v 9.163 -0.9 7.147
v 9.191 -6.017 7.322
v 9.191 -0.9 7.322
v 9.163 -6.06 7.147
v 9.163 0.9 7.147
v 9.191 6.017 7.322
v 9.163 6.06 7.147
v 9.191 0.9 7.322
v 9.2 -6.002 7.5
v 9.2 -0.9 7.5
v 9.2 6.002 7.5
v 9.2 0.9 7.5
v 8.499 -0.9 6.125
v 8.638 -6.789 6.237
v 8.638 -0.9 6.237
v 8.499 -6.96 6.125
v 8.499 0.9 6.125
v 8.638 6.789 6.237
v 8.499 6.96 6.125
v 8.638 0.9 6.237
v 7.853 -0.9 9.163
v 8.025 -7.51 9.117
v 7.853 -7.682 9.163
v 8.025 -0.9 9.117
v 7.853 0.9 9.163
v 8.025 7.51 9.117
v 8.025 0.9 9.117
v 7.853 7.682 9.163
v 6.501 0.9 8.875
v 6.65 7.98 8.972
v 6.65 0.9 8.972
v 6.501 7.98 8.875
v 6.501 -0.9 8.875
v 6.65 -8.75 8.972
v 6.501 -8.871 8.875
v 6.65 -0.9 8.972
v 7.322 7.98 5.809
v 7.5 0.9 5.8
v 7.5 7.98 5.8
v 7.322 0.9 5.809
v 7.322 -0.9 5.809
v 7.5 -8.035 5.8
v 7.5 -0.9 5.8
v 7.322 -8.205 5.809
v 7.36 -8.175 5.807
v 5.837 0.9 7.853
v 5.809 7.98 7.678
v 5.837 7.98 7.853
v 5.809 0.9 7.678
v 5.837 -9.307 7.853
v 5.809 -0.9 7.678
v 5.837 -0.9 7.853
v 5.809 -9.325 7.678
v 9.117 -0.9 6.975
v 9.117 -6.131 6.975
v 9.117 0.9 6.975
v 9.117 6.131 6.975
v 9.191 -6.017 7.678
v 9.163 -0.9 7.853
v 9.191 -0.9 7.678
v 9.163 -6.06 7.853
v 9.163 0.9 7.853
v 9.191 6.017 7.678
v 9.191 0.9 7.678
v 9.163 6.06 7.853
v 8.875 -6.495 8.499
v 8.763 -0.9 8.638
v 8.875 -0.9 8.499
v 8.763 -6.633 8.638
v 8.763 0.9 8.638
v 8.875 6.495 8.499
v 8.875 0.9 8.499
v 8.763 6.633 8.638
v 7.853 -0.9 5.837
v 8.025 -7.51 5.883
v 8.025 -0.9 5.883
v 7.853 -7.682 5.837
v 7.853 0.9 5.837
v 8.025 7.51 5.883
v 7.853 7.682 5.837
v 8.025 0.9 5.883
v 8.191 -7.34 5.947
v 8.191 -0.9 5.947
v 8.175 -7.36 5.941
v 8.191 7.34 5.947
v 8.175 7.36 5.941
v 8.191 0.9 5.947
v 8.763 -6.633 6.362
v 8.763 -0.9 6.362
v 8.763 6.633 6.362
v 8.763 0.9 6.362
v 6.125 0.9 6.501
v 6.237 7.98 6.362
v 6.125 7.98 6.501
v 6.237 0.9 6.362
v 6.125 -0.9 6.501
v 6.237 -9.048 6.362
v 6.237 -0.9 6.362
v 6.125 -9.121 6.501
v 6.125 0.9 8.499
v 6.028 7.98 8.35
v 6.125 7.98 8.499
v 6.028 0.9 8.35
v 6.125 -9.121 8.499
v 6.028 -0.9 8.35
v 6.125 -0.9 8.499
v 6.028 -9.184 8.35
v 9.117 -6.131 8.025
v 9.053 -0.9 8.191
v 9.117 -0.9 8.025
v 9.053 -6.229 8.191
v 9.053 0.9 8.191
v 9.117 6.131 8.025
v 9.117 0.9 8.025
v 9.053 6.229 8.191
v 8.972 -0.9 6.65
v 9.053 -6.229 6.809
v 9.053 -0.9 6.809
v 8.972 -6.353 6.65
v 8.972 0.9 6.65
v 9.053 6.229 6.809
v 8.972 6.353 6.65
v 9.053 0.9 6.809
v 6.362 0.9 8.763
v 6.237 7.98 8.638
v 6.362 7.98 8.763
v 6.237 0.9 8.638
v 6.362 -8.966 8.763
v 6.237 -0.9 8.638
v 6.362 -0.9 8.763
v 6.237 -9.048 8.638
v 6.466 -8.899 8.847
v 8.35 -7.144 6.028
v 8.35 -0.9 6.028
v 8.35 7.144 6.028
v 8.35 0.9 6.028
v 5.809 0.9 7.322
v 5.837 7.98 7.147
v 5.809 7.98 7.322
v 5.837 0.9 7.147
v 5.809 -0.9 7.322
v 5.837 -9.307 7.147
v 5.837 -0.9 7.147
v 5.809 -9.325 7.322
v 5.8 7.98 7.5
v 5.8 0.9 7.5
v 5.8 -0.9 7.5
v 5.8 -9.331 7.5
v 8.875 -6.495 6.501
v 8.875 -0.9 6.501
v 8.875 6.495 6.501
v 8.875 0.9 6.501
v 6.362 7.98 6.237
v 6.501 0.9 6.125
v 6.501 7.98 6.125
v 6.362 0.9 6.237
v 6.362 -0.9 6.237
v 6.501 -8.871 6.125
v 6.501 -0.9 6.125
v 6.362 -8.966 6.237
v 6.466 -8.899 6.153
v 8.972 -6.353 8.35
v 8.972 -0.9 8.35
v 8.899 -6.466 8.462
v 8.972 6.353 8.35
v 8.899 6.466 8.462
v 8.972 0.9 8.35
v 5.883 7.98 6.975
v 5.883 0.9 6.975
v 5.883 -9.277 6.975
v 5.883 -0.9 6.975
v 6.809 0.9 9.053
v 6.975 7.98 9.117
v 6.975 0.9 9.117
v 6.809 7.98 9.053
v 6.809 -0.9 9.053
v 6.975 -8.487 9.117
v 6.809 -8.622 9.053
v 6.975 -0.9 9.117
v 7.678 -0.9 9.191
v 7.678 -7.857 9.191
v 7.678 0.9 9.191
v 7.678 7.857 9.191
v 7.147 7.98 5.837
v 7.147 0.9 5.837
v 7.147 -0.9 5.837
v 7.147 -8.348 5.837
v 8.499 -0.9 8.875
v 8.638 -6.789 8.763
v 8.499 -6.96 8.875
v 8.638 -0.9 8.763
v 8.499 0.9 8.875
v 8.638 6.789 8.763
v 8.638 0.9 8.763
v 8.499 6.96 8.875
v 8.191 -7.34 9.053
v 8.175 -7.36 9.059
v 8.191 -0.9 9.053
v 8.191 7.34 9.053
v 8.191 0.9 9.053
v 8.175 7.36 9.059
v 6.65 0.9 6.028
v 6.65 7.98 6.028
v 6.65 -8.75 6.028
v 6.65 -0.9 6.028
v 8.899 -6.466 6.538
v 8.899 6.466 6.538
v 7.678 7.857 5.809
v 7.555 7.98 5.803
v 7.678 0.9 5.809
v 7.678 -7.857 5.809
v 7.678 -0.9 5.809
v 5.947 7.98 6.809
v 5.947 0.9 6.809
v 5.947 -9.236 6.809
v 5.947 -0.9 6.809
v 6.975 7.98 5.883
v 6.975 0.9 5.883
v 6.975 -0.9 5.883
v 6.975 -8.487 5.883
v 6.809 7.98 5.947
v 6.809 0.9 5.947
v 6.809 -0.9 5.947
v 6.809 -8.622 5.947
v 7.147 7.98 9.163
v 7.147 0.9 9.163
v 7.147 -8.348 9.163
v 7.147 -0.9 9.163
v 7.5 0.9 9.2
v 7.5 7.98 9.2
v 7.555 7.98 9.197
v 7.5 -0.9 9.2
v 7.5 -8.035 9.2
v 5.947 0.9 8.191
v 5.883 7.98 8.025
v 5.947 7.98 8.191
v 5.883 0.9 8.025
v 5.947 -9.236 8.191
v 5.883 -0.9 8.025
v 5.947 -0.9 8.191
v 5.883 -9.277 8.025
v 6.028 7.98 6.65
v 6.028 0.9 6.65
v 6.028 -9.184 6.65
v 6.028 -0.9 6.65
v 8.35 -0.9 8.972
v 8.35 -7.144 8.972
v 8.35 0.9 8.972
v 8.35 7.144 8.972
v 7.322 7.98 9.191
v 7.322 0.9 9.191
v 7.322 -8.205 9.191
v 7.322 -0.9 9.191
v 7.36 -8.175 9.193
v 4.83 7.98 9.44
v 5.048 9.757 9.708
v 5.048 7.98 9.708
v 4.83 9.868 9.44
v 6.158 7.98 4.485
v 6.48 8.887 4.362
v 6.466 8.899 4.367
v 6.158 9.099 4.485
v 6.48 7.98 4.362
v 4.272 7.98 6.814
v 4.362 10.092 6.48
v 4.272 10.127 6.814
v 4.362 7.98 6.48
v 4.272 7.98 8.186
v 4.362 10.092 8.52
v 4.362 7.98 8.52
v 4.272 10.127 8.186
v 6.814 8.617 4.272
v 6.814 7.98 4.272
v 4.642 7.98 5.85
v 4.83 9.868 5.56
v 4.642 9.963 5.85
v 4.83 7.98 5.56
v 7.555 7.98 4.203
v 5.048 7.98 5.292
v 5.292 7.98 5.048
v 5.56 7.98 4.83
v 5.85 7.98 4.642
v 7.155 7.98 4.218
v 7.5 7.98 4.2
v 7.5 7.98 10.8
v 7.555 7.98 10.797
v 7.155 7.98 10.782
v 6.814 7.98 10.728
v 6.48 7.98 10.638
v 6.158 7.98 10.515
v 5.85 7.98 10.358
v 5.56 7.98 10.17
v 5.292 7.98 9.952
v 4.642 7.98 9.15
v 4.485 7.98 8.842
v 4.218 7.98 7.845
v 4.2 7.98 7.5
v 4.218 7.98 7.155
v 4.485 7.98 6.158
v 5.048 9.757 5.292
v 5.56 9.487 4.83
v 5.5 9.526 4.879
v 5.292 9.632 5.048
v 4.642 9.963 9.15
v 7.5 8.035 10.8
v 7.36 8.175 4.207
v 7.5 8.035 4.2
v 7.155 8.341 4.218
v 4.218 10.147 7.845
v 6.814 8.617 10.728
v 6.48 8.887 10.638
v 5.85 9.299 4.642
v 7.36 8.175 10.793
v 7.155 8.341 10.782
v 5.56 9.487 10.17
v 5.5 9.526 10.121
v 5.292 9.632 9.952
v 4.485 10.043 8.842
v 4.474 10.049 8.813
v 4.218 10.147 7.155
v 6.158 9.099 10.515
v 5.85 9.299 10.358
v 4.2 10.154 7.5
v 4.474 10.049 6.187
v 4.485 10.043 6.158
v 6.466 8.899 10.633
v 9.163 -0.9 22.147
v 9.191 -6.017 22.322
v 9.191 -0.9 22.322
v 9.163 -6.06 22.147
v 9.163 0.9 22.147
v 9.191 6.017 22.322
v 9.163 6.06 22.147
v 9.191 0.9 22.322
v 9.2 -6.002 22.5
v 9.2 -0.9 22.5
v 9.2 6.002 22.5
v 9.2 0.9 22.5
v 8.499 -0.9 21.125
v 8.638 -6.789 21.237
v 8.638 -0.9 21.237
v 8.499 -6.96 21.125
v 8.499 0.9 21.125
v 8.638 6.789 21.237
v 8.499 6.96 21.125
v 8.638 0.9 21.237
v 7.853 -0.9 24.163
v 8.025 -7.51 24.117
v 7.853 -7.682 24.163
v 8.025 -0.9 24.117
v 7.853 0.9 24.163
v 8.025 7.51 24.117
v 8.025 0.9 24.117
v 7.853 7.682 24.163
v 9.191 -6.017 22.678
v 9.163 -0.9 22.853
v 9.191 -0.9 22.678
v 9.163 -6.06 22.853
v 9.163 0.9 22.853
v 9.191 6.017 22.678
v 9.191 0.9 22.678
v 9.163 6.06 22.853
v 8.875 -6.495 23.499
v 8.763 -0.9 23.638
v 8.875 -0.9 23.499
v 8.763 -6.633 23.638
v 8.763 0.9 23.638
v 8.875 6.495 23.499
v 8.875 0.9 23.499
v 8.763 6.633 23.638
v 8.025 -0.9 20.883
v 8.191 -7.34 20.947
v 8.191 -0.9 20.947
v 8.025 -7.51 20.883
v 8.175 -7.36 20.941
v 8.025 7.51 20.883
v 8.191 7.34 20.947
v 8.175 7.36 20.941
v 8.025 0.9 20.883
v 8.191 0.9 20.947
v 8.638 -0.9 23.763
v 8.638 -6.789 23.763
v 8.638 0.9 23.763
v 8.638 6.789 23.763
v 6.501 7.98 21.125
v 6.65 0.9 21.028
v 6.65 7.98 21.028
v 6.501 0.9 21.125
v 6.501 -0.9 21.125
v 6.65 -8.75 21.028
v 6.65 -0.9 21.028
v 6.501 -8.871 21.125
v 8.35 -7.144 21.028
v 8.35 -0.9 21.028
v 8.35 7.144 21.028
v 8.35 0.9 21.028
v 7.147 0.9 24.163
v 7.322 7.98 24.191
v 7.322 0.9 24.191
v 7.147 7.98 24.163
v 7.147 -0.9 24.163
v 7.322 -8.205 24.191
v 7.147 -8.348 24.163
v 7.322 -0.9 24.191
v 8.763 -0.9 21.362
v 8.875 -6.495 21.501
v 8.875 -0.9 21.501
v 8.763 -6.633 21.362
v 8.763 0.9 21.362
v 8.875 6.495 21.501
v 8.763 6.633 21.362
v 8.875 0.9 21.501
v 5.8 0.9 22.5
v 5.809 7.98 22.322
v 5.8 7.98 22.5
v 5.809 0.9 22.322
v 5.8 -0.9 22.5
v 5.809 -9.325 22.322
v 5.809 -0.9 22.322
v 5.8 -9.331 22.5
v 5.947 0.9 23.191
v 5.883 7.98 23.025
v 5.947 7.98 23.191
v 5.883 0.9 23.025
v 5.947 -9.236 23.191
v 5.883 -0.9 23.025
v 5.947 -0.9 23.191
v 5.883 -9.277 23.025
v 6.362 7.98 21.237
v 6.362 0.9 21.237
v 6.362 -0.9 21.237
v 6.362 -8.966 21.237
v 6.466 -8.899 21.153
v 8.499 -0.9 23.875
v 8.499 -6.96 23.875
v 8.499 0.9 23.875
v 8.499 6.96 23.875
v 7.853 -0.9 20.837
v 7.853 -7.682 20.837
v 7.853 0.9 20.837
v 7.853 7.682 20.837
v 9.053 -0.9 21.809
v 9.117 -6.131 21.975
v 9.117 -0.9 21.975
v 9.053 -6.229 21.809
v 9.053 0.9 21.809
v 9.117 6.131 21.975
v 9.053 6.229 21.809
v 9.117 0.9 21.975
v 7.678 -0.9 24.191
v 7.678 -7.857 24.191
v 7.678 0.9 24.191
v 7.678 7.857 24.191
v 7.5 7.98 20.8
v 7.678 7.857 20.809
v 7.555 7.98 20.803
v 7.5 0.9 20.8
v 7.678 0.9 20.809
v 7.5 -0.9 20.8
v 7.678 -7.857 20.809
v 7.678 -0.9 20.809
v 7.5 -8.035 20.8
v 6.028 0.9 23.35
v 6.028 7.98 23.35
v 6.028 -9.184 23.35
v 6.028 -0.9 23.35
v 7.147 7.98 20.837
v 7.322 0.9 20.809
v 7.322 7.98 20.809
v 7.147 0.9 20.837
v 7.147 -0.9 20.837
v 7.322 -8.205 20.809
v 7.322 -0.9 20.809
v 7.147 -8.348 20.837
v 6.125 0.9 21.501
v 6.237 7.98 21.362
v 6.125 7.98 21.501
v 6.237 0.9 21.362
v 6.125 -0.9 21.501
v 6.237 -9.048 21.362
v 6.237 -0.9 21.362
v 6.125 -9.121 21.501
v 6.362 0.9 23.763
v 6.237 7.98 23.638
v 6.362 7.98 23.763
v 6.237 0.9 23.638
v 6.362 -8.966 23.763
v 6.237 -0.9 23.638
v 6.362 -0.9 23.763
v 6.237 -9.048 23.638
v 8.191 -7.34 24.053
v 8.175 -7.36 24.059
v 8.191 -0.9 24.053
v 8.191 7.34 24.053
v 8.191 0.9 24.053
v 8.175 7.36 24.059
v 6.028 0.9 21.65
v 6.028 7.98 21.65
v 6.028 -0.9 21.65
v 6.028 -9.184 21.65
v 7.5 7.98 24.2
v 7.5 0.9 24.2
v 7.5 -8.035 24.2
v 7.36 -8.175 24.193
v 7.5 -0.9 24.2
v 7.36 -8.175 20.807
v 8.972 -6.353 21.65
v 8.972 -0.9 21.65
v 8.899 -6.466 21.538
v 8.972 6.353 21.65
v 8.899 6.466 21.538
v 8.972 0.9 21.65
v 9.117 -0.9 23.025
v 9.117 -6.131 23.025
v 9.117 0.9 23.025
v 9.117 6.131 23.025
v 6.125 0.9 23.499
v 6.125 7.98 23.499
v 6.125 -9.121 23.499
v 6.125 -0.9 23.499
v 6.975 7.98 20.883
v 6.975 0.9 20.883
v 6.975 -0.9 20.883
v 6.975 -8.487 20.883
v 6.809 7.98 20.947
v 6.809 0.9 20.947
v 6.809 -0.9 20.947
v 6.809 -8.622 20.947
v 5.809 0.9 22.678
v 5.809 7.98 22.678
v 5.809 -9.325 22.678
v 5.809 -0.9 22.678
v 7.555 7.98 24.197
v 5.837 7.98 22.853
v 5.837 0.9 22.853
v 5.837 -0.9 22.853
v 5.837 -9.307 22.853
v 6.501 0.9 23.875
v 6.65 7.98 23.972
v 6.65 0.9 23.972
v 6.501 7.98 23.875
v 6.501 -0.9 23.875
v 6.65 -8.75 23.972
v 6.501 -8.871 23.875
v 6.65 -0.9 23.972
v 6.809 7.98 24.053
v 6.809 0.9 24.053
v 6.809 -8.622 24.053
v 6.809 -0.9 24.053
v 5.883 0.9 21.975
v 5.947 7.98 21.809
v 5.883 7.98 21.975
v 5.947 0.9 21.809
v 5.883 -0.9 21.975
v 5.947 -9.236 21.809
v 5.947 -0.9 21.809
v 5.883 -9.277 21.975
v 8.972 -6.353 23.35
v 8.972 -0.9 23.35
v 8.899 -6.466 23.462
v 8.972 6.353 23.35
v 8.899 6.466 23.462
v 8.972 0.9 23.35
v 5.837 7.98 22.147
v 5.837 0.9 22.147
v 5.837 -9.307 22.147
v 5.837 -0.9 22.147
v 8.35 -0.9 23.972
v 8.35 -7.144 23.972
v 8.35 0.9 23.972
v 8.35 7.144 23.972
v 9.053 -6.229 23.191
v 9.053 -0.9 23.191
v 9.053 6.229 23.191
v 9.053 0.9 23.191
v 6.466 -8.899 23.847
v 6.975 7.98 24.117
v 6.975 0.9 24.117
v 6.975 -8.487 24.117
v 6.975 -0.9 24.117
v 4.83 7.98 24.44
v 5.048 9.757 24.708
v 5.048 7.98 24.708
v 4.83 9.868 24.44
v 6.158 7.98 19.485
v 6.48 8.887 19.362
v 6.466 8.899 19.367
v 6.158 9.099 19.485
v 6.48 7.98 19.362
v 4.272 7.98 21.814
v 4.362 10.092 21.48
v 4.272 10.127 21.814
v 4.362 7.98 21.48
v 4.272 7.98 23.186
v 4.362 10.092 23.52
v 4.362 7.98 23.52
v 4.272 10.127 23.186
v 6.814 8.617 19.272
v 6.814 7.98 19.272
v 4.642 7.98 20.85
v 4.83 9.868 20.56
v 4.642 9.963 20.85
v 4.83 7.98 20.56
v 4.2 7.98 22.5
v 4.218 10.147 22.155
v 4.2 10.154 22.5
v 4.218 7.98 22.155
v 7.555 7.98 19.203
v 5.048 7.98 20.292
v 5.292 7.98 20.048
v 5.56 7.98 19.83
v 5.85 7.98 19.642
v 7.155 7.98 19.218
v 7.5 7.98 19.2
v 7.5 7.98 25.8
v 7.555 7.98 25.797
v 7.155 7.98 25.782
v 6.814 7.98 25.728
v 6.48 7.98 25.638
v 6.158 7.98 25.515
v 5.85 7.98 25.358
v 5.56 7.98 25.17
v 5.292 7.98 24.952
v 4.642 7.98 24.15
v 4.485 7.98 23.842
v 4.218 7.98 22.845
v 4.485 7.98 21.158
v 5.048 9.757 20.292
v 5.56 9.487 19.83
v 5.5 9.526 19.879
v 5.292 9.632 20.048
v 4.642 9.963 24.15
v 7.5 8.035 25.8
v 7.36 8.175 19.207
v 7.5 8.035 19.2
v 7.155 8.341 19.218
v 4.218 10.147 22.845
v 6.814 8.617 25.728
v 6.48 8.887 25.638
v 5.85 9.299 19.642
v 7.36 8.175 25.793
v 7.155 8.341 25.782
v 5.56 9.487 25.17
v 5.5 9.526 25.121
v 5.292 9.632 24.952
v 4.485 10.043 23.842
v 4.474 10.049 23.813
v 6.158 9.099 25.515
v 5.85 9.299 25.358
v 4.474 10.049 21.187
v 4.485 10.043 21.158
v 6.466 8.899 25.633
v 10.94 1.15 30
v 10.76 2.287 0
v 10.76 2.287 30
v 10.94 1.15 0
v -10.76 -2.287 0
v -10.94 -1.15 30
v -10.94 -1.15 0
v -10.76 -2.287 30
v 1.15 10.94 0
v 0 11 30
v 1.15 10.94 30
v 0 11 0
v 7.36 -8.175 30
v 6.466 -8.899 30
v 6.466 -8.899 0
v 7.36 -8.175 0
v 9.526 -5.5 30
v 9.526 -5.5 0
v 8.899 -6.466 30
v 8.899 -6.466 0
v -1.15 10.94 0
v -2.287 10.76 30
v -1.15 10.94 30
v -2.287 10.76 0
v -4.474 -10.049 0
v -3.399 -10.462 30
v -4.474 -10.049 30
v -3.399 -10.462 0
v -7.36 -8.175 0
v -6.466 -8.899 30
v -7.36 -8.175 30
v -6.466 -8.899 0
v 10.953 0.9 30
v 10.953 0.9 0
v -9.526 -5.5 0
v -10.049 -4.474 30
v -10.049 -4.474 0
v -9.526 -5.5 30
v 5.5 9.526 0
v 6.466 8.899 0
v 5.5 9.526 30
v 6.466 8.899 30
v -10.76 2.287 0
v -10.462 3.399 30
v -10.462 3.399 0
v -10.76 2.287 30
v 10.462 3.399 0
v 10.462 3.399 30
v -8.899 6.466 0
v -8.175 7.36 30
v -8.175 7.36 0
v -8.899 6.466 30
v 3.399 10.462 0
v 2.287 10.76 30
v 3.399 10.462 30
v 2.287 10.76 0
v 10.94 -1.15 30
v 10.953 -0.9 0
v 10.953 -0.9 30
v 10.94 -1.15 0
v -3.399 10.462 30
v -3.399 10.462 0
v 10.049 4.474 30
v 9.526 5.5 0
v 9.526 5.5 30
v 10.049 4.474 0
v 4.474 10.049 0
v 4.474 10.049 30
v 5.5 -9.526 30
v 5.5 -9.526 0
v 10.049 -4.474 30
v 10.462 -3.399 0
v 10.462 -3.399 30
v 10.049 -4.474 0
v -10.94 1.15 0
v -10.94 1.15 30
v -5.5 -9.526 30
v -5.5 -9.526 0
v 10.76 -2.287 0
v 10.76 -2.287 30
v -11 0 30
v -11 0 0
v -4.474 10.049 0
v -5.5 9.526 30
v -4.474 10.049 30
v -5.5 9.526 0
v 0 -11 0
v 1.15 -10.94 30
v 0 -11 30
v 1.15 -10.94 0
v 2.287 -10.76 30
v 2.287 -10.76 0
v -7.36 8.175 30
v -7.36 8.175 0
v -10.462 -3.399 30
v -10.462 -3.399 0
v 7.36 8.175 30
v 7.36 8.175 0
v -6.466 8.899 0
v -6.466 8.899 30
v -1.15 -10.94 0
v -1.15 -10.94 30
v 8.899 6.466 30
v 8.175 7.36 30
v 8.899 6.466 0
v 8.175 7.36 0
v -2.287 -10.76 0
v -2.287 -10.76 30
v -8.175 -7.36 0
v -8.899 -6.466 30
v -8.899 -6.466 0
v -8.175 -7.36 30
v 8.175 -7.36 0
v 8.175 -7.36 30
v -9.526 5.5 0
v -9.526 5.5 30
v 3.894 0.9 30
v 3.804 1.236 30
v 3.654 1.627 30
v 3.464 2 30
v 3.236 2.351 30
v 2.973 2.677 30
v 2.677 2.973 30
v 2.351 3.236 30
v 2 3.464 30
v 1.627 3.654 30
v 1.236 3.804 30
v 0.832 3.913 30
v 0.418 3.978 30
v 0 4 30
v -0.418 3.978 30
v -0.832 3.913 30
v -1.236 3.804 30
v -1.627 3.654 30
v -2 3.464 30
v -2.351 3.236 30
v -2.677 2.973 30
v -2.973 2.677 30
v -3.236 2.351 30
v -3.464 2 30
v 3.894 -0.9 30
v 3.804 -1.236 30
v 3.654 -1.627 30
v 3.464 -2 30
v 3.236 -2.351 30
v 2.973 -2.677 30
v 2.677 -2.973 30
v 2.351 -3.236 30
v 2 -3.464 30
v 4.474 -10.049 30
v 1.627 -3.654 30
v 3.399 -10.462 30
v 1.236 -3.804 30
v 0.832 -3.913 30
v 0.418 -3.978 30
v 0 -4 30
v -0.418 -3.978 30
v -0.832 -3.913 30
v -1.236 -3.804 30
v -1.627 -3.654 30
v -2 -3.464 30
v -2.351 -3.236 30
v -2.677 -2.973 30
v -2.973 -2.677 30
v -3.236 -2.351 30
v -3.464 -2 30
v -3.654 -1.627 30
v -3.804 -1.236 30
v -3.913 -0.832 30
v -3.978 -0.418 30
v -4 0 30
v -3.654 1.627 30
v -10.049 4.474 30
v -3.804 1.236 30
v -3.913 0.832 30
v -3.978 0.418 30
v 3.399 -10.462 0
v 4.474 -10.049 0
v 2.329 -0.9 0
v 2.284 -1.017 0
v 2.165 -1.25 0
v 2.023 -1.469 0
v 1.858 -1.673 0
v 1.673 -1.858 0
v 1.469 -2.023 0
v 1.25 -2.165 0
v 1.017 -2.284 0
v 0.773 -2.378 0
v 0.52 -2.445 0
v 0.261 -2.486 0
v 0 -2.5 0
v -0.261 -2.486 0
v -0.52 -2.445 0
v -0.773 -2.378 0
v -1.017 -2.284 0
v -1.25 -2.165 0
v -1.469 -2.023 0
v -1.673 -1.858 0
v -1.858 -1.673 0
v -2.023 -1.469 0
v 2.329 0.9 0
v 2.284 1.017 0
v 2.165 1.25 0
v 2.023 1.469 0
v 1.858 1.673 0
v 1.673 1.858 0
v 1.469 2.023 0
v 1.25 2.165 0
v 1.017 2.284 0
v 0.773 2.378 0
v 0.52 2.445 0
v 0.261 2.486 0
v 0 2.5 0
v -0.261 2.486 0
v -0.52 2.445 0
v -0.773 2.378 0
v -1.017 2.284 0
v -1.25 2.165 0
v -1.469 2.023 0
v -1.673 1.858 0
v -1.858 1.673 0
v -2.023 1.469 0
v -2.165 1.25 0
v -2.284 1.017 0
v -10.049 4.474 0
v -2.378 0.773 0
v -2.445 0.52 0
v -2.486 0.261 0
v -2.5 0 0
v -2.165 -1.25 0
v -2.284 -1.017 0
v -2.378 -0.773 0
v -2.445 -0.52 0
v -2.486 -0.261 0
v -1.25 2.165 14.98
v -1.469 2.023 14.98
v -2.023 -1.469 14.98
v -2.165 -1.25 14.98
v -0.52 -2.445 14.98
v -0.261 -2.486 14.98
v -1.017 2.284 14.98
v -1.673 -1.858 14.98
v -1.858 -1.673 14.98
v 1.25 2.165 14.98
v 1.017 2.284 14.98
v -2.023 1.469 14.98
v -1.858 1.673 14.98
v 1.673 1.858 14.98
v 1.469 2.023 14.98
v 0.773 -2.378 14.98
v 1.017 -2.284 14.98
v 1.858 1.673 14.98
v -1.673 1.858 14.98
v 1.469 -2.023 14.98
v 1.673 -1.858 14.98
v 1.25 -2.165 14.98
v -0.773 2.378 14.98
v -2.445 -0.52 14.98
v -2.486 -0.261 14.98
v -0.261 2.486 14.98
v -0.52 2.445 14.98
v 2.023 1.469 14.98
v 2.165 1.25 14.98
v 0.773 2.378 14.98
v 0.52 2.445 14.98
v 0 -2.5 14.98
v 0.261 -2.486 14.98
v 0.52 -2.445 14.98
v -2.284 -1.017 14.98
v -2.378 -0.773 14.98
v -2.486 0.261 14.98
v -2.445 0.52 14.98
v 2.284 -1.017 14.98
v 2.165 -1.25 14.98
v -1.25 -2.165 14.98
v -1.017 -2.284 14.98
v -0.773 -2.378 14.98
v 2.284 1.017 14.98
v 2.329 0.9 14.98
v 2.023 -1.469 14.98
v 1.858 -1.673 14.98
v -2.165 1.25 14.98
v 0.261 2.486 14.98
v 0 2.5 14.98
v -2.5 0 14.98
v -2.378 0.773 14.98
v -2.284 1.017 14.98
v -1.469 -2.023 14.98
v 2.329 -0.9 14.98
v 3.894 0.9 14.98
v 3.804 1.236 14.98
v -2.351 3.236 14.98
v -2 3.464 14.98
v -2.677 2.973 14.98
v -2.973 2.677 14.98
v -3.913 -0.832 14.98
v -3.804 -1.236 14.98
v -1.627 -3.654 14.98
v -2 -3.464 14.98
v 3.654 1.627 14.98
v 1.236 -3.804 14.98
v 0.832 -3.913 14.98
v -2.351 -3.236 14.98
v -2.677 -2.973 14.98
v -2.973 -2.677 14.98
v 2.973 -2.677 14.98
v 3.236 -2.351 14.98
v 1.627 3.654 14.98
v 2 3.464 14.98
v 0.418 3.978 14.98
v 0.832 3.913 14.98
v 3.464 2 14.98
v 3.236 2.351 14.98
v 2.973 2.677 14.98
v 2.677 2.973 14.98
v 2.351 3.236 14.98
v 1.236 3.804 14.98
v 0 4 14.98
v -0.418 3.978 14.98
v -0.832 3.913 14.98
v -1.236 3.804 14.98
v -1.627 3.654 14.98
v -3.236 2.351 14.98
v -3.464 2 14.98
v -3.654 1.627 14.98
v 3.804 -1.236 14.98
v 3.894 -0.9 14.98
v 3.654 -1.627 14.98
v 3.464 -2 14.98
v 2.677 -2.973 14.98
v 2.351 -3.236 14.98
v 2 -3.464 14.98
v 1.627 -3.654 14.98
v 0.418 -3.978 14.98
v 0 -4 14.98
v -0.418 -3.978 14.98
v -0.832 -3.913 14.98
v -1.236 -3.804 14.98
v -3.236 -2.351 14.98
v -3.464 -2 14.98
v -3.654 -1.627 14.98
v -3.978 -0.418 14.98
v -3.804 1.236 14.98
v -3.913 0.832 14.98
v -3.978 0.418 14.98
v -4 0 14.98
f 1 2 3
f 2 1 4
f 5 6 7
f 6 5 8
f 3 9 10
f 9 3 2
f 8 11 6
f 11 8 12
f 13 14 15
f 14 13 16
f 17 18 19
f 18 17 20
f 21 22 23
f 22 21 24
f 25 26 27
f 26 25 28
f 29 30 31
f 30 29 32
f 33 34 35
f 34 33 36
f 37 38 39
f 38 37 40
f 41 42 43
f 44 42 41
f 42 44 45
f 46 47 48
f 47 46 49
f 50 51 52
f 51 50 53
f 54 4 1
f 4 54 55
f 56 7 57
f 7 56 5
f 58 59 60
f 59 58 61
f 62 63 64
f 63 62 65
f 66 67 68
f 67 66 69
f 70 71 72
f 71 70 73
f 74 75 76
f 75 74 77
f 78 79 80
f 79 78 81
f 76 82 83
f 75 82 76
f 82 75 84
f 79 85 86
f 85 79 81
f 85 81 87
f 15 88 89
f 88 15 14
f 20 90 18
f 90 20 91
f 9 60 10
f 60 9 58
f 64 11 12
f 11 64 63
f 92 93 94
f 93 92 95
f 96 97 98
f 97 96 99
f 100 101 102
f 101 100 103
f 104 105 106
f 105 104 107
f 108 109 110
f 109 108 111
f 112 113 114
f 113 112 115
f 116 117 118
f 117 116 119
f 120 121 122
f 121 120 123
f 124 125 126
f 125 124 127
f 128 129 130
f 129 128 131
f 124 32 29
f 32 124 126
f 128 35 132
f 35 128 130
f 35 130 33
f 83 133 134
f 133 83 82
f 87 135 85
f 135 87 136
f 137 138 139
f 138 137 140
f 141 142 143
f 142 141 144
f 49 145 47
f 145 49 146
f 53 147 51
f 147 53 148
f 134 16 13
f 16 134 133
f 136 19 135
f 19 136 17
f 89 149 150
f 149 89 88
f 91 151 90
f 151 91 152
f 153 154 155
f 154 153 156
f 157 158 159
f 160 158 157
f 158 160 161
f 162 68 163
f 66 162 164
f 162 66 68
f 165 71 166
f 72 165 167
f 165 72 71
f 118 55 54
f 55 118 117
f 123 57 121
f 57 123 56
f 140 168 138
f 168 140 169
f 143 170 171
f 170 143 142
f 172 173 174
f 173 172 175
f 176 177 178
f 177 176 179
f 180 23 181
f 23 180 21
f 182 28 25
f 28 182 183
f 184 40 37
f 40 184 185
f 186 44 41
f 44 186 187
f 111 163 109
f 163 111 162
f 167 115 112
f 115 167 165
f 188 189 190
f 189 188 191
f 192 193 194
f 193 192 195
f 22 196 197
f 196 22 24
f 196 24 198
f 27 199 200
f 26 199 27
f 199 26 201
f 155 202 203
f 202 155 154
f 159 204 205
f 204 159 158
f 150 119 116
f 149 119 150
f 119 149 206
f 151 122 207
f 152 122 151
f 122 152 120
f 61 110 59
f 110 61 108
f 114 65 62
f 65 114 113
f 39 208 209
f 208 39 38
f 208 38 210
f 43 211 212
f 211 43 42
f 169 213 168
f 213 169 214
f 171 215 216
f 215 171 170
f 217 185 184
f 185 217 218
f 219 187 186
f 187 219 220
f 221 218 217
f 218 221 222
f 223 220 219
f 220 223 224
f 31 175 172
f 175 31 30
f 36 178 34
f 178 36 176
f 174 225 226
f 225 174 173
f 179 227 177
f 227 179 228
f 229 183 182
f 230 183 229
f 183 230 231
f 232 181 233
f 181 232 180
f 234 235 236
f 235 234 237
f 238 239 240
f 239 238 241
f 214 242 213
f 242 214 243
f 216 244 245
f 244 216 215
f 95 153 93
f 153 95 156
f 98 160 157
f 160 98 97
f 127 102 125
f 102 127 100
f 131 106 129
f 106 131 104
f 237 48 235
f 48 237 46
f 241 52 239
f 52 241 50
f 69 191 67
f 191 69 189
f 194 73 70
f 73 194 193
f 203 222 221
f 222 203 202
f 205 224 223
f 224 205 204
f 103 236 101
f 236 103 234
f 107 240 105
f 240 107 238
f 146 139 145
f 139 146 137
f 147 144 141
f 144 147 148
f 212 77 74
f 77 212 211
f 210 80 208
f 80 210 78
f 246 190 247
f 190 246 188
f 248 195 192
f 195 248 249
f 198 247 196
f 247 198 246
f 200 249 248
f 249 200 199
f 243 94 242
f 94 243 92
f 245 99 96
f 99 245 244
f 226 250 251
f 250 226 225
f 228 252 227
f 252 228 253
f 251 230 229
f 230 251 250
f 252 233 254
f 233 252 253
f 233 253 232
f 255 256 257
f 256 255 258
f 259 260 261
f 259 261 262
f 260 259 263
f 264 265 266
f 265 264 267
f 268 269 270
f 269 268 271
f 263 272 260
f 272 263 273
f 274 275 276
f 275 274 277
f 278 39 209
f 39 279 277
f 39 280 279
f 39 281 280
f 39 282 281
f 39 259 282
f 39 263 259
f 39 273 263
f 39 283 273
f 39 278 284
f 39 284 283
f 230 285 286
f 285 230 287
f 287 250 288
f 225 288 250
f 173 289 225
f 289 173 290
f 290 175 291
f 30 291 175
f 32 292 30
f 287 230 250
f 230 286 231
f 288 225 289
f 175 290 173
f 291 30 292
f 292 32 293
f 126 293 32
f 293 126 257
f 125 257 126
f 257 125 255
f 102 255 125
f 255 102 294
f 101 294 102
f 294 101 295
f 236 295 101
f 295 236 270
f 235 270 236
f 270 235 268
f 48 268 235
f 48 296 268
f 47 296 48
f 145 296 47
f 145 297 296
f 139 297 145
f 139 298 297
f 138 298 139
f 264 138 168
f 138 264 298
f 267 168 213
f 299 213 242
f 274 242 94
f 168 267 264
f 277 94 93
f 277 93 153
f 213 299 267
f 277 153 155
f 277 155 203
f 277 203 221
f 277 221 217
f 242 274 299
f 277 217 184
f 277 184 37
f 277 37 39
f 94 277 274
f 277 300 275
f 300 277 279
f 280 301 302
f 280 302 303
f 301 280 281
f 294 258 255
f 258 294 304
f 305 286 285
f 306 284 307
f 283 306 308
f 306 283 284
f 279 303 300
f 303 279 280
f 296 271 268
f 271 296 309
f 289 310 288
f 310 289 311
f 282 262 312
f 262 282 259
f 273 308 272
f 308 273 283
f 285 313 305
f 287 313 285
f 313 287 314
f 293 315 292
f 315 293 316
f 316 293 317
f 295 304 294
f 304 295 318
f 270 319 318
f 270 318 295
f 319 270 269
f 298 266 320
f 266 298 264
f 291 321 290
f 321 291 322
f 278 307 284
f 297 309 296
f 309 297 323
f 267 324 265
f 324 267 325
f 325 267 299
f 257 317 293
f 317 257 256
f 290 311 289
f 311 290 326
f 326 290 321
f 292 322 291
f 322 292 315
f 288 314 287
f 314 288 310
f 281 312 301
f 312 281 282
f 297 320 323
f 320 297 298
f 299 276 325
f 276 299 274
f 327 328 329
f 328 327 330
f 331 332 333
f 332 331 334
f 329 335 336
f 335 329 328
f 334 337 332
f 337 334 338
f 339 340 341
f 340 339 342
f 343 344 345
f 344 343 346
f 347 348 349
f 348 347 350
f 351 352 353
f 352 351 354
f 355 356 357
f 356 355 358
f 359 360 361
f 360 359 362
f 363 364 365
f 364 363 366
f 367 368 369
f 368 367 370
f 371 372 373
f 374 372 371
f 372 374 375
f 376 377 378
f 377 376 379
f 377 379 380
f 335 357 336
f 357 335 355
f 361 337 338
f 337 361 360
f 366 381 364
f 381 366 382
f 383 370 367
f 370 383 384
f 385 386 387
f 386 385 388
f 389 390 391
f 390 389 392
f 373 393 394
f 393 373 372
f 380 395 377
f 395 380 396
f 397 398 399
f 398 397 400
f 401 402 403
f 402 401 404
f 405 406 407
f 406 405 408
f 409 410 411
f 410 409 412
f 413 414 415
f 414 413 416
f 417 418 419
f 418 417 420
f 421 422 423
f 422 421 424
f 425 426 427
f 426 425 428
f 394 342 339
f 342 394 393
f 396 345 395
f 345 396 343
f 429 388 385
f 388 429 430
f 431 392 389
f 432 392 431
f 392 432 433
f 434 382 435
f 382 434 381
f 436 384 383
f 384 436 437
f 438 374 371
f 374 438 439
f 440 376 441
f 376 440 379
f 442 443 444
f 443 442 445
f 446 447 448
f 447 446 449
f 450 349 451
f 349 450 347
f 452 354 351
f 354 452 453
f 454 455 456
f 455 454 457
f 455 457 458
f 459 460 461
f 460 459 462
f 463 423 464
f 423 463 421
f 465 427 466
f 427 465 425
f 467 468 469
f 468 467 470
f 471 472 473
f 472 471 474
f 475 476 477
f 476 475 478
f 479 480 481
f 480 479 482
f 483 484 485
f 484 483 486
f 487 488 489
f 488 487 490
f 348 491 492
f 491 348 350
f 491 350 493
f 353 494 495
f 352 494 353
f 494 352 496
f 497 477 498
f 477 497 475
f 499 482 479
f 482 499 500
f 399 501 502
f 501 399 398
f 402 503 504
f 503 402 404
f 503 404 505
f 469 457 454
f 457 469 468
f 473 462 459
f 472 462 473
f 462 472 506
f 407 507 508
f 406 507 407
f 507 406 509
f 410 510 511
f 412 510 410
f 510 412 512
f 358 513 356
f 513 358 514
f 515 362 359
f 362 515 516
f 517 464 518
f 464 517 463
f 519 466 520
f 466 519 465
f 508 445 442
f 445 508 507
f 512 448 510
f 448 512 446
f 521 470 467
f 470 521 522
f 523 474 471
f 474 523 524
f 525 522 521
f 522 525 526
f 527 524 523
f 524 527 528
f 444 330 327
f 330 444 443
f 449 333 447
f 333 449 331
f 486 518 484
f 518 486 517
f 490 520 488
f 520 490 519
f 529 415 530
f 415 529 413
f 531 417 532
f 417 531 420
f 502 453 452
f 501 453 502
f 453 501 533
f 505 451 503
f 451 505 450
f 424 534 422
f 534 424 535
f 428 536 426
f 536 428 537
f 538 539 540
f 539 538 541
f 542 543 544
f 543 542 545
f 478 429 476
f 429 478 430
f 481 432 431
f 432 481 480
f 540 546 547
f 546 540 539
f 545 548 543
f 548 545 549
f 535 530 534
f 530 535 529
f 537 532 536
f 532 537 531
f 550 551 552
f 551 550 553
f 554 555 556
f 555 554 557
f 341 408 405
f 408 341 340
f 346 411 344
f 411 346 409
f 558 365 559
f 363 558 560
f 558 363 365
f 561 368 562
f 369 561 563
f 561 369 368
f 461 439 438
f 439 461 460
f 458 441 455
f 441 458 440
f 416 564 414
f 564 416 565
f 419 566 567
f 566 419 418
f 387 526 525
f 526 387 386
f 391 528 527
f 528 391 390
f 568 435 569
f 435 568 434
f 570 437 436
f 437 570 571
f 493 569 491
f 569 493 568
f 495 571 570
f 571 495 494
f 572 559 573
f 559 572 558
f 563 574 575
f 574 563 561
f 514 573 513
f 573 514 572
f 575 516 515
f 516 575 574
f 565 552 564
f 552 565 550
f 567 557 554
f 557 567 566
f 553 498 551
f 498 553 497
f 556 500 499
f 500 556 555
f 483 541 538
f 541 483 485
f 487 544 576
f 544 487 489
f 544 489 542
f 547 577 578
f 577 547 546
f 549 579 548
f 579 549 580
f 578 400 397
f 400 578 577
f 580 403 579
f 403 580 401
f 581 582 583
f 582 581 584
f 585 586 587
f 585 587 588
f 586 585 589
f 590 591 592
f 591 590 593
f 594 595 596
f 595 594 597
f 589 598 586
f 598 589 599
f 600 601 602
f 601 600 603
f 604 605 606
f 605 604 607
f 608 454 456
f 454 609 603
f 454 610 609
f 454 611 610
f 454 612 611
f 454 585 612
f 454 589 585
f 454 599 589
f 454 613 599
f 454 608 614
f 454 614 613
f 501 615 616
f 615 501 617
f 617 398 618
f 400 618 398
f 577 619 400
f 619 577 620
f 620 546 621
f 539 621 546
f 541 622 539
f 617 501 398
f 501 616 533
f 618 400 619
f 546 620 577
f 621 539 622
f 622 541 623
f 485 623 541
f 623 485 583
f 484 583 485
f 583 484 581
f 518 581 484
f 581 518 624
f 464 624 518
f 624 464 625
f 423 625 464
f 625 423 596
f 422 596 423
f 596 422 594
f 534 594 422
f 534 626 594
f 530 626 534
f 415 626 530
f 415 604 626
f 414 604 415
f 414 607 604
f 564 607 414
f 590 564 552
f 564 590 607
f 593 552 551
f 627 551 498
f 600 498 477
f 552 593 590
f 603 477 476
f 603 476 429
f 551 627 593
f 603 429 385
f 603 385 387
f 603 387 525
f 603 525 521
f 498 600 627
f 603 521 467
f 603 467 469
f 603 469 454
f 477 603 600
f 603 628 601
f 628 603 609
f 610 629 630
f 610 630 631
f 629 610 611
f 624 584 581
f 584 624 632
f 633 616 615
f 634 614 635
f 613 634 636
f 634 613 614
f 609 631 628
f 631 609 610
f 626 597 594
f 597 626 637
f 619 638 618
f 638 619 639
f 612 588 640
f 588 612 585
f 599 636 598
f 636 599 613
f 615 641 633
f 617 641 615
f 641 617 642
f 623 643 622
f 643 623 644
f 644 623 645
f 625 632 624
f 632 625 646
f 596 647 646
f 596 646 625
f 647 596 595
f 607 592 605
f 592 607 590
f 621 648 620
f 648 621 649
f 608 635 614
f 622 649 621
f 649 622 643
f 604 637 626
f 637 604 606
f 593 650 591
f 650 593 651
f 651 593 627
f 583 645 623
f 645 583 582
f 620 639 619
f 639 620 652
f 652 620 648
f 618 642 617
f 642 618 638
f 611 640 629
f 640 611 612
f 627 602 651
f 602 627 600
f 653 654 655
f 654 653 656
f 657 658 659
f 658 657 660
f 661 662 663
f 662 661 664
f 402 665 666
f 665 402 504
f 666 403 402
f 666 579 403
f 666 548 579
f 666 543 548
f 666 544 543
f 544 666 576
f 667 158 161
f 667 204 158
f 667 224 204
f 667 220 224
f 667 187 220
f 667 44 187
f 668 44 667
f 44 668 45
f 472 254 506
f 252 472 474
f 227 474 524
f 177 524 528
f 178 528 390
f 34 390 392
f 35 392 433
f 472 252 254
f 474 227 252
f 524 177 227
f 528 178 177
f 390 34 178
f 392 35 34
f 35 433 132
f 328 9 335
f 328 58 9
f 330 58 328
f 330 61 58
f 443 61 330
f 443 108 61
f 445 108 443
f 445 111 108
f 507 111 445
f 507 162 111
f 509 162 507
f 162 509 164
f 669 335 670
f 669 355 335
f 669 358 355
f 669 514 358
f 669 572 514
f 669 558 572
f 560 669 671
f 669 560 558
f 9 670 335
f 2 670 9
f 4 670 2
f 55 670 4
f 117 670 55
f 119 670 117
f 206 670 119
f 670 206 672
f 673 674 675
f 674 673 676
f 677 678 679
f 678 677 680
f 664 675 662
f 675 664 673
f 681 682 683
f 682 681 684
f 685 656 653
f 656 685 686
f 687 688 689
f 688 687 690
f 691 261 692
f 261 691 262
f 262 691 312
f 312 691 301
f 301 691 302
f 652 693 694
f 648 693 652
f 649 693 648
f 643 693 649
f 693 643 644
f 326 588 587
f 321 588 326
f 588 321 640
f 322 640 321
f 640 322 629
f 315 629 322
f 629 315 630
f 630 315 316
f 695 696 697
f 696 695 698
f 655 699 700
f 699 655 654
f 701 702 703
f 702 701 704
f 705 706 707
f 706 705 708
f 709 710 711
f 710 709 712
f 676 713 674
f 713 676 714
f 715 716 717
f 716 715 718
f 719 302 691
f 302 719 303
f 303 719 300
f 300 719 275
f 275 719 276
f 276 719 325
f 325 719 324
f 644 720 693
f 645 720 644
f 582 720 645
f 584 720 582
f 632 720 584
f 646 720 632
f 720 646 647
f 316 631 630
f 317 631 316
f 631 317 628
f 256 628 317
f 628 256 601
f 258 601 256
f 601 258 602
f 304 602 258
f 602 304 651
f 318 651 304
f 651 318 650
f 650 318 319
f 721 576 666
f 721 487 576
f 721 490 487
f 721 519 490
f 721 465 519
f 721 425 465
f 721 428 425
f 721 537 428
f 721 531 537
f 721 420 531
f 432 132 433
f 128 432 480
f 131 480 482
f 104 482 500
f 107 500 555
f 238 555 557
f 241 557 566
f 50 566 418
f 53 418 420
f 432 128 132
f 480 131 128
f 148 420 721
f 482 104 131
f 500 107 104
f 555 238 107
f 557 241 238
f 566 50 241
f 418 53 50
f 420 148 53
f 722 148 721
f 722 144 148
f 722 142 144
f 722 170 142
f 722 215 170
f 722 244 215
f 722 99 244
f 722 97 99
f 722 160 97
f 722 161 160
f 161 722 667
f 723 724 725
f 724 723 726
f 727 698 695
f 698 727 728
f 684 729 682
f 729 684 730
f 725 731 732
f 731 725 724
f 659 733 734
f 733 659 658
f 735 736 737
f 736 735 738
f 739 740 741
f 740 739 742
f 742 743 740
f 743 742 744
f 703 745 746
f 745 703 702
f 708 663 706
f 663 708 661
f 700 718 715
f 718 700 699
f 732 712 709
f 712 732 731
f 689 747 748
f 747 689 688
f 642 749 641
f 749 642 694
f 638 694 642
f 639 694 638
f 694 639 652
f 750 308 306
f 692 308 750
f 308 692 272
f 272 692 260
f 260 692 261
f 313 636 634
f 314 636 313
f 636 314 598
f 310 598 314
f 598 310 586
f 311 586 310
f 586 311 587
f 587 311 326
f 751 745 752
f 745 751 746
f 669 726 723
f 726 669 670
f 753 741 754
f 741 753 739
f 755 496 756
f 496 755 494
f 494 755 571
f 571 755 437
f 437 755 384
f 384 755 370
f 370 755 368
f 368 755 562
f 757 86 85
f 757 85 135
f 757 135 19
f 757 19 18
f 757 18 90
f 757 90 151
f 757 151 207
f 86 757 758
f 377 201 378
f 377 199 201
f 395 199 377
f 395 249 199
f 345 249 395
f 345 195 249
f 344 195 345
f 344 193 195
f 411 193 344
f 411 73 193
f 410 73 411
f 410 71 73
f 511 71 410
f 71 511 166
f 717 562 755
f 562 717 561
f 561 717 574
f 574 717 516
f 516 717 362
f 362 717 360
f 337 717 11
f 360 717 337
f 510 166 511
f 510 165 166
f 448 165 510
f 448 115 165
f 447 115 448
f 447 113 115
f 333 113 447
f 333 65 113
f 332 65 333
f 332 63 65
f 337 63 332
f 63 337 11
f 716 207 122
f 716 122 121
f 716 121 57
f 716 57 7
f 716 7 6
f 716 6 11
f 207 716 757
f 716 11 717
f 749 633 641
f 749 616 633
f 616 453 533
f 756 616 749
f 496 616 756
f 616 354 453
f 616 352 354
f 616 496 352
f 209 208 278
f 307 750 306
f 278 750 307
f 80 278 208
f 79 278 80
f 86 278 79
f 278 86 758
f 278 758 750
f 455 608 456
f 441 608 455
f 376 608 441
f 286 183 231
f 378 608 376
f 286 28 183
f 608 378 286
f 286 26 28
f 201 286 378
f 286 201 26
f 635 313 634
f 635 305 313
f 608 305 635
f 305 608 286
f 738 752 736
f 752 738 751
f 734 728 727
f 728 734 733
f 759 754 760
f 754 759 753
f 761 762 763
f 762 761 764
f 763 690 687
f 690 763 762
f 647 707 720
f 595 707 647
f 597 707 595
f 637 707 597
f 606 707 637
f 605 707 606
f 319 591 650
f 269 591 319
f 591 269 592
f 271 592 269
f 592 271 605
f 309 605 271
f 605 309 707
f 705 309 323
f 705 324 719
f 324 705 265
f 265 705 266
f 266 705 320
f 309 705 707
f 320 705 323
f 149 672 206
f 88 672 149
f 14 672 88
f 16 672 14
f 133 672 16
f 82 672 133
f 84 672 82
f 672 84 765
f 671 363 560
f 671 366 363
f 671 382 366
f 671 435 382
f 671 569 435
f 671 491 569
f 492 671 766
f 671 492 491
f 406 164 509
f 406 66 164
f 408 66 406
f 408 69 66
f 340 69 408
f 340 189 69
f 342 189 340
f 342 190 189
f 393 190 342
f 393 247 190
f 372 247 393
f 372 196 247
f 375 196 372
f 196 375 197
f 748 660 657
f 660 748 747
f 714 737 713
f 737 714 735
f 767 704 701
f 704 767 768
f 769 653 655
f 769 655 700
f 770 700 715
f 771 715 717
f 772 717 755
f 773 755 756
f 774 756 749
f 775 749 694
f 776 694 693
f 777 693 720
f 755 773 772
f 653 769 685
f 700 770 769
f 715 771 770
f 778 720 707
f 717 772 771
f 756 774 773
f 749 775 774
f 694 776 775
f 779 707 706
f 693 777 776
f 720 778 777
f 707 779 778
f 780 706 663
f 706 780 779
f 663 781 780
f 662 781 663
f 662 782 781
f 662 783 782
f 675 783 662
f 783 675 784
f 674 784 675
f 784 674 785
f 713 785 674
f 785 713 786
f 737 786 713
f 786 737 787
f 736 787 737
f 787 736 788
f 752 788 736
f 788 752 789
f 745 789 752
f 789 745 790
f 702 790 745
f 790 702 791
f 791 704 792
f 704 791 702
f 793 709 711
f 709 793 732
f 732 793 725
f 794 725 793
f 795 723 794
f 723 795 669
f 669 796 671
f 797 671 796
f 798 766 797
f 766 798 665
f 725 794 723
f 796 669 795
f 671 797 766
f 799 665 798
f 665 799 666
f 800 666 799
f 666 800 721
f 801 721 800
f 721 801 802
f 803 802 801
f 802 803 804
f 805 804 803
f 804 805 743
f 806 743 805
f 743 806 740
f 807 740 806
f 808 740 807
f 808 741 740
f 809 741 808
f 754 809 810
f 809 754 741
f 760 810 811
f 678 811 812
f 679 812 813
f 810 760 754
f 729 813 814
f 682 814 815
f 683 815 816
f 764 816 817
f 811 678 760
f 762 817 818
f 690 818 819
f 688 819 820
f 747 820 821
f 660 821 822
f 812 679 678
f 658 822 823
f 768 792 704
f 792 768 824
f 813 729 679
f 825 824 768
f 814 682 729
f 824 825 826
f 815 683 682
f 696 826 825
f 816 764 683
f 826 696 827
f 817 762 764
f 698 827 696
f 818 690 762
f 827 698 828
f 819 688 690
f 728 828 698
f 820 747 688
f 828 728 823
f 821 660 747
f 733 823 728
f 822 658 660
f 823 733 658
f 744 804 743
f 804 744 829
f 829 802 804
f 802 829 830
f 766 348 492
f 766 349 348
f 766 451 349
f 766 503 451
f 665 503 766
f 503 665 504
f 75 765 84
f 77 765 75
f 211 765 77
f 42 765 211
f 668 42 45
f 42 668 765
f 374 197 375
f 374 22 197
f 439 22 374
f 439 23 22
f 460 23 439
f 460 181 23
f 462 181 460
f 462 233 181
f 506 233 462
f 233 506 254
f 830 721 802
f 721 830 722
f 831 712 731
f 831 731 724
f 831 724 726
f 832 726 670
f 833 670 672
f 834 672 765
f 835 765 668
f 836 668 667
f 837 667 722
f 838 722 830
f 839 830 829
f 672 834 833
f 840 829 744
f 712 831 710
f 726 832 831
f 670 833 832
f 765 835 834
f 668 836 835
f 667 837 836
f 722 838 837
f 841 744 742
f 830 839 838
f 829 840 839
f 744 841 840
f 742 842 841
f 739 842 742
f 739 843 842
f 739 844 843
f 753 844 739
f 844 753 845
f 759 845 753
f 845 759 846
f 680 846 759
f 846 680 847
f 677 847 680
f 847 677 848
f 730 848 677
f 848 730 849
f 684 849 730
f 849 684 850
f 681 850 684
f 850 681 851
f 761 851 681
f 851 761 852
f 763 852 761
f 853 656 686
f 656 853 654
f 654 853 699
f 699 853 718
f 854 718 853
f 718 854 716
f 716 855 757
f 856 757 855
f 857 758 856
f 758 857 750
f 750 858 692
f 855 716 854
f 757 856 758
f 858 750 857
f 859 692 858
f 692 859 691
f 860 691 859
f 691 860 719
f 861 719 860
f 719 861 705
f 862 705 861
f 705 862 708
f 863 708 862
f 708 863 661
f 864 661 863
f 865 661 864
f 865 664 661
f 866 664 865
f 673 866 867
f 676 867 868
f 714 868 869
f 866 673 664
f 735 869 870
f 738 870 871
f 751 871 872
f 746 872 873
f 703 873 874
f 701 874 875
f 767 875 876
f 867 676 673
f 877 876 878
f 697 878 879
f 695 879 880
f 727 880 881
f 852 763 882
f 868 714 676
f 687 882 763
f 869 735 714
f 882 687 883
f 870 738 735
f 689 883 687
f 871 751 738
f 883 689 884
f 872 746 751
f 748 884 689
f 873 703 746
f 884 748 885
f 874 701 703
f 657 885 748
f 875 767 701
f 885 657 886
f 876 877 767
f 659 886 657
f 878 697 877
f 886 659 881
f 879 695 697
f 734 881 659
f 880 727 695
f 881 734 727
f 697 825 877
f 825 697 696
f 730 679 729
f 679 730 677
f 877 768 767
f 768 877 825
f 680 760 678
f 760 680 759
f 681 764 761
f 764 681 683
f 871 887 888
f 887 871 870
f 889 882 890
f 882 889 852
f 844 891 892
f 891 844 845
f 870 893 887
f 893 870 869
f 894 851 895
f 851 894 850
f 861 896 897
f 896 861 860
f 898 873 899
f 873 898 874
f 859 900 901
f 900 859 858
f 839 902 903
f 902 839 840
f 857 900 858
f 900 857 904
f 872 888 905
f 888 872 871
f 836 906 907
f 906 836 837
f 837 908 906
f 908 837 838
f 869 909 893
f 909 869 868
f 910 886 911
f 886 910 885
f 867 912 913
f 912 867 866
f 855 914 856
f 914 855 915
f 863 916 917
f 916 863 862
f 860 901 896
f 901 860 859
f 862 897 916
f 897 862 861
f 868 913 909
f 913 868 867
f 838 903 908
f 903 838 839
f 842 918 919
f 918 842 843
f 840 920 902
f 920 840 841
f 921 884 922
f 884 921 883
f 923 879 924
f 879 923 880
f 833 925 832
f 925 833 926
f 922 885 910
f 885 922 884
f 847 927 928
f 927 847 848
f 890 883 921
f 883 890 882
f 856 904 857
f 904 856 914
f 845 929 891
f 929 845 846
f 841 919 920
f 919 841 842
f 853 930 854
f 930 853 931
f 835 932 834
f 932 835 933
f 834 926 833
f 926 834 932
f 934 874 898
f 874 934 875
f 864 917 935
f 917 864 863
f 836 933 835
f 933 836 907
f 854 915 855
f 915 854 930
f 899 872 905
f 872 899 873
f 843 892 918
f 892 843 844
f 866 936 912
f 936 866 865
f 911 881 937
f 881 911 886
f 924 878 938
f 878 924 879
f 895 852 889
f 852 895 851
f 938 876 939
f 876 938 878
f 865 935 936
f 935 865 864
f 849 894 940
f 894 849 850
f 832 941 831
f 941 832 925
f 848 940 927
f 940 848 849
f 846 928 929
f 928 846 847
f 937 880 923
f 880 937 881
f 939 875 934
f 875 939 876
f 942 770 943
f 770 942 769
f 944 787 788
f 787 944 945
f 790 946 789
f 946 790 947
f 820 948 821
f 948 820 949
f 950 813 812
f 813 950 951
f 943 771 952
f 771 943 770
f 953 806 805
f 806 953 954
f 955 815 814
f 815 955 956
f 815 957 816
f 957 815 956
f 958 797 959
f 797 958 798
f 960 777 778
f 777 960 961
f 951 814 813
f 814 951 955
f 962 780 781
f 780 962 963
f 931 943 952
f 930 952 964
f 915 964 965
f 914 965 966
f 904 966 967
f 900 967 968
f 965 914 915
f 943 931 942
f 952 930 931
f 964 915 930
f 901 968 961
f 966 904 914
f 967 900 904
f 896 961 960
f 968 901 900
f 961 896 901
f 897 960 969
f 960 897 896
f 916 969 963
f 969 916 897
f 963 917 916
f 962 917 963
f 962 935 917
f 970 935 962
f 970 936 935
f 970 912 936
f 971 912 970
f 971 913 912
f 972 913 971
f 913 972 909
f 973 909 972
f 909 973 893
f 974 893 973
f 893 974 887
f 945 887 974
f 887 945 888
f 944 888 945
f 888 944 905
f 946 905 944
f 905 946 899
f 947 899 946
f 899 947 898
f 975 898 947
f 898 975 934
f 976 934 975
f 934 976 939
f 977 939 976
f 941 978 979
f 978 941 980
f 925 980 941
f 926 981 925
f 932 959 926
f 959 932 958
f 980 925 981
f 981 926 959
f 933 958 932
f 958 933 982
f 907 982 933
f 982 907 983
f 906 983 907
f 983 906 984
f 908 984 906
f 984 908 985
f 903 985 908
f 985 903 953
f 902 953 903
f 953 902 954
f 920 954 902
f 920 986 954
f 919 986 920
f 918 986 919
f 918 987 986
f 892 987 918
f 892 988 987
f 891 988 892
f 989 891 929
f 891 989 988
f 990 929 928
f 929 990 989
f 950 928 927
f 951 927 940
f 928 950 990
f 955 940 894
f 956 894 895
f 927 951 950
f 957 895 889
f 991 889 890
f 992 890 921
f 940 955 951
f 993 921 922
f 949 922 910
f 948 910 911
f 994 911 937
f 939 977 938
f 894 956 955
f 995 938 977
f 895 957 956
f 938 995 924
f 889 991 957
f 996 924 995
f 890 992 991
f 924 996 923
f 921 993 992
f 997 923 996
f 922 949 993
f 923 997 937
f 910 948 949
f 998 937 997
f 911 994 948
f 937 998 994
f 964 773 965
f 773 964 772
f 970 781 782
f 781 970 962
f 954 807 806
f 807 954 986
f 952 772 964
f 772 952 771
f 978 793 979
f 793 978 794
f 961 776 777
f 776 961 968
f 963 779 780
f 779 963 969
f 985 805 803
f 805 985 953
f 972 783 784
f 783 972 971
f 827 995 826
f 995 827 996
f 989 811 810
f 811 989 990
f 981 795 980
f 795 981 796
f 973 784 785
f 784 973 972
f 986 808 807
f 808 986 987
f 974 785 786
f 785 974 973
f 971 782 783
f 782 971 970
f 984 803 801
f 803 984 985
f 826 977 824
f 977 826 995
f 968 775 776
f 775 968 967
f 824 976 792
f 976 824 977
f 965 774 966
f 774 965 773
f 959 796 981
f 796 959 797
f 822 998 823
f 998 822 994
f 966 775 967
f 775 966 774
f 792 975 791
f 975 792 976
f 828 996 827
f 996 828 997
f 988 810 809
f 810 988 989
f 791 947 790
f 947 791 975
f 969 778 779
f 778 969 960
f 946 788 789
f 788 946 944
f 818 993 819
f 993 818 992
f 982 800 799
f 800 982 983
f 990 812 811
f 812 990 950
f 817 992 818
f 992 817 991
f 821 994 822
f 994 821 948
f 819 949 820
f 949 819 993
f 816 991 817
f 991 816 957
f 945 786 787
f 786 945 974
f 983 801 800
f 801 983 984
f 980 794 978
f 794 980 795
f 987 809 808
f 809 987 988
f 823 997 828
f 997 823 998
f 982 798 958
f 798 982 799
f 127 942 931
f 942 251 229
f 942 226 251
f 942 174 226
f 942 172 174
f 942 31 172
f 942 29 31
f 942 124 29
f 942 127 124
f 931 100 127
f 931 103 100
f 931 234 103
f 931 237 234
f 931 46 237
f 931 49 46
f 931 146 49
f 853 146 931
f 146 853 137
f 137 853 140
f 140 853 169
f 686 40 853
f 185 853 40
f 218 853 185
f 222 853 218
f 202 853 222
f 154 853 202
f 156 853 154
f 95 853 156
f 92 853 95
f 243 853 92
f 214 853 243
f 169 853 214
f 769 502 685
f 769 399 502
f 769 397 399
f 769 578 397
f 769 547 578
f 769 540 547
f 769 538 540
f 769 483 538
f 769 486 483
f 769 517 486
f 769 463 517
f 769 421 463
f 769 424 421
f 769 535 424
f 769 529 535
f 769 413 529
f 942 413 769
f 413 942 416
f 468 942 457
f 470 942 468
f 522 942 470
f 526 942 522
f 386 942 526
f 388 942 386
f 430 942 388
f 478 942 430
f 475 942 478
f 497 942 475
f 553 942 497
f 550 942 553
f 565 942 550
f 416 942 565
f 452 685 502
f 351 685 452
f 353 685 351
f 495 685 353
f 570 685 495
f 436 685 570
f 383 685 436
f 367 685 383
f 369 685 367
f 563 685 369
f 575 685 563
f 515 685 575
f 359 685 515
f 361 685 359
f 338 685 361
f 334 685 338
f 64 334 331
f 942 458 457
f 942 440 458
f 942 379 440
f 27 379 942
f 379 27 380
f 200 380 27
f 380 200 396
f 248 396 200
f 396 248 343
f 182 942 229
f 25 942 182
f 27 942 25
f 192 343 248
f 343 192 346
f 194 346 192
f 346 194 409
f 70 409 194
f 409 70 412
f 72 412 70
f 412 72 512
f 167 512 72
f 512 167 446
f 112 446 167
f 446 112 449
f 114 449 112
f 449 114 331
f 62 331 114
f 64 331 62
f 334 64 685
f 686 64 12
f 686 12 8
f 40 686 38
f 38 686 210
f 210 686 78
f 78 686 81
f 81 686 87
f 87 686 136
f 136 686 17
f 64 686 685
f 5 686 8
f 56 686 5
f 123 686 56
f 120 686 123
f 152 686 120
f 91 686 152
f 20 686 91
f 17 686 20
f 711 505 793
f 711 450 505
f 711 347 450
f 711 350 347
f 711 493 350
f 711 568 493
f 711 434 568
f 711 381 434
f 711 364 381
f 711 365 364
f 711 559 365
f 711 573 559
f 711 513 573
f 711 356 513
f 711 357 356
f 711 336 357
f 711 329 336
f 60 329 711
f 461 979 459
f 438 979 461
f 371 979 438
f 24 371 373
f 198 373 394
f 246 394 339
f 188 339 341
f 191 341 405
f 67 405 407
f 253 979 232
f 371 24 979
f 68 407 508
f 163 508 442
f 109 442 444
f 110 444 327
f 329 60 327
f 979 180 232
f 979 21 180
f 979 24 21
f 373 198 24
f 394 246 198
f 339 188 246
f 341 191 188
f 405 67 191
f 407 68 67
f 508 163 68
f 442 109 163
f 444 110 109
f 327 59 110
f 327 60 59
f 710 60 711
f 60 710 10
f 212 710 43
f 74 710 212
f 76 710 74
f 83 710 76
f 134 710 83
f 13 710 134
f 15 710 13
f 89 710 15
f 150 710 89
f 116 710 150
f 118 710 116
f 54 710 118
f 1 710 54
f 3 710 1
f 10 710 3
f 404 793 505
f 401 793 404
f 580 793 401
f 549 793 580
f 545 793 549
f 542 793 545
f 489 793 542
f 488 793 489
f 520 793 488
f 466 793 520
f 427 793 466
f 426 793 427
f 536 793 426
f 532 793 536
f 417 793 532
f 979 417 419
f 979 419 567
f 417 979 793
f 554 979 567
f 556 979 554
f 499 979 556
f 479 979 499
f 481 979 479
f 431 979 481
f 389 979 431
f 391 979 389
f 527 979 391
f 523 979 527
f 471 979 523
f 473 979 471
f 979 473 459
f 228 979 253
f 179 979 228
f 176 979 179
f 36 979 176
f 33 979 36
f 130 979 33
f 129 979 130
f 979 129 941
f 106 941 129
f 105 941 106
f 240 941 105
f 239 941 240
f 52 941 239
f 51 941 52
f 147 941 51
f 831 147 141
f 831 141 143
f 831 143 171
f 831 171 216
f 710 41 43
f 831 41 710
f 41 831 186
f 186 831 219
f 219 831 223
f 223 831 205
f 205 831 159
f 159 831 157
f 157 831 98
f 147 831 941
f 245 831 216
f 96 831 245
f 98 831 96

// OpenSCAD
// Split shaft coupling 5 mm to 8 mm.
$fn = 60;
eps = 0.02;
shaft_a = 5;
shaft_b = 8;
outer_d = 22;
length = 30;
slit_w = 1.8;
screw_d = 3.4;
module clamp_hole(z) {
    translate([outer_d / 2 - 3.5, -outer_d / 2 - eps, z]) rotate([-90, 0, 0]) cylinder(d = screw_d, h = outer_d + 2 * eps);
    translate([outer_d / 2 - 3.5, outer_d / 2 - 3 - eps, z]) rotate([-90, 0, 0]) cylinder(d = 6.6, h = 3 + 2 * eps);
}
difference() {
    cylinder(d = outer_d, h = length);
    translate([0, 0, -eps]) cylinder(d = shaft_a, h = length / 2 + eps);
    translate([0, 0, length / 2 - eps]) cylinder(d = shaft_b, h = length / 2 + eps);
    translate([0, -slit_w / 2, -eps]) cube([outer_d / 2 + eps, slit_w, length + 2 * eps]);
    clamp_hole(length / 4);
    clamp_hole(3 * length / 4);
}
